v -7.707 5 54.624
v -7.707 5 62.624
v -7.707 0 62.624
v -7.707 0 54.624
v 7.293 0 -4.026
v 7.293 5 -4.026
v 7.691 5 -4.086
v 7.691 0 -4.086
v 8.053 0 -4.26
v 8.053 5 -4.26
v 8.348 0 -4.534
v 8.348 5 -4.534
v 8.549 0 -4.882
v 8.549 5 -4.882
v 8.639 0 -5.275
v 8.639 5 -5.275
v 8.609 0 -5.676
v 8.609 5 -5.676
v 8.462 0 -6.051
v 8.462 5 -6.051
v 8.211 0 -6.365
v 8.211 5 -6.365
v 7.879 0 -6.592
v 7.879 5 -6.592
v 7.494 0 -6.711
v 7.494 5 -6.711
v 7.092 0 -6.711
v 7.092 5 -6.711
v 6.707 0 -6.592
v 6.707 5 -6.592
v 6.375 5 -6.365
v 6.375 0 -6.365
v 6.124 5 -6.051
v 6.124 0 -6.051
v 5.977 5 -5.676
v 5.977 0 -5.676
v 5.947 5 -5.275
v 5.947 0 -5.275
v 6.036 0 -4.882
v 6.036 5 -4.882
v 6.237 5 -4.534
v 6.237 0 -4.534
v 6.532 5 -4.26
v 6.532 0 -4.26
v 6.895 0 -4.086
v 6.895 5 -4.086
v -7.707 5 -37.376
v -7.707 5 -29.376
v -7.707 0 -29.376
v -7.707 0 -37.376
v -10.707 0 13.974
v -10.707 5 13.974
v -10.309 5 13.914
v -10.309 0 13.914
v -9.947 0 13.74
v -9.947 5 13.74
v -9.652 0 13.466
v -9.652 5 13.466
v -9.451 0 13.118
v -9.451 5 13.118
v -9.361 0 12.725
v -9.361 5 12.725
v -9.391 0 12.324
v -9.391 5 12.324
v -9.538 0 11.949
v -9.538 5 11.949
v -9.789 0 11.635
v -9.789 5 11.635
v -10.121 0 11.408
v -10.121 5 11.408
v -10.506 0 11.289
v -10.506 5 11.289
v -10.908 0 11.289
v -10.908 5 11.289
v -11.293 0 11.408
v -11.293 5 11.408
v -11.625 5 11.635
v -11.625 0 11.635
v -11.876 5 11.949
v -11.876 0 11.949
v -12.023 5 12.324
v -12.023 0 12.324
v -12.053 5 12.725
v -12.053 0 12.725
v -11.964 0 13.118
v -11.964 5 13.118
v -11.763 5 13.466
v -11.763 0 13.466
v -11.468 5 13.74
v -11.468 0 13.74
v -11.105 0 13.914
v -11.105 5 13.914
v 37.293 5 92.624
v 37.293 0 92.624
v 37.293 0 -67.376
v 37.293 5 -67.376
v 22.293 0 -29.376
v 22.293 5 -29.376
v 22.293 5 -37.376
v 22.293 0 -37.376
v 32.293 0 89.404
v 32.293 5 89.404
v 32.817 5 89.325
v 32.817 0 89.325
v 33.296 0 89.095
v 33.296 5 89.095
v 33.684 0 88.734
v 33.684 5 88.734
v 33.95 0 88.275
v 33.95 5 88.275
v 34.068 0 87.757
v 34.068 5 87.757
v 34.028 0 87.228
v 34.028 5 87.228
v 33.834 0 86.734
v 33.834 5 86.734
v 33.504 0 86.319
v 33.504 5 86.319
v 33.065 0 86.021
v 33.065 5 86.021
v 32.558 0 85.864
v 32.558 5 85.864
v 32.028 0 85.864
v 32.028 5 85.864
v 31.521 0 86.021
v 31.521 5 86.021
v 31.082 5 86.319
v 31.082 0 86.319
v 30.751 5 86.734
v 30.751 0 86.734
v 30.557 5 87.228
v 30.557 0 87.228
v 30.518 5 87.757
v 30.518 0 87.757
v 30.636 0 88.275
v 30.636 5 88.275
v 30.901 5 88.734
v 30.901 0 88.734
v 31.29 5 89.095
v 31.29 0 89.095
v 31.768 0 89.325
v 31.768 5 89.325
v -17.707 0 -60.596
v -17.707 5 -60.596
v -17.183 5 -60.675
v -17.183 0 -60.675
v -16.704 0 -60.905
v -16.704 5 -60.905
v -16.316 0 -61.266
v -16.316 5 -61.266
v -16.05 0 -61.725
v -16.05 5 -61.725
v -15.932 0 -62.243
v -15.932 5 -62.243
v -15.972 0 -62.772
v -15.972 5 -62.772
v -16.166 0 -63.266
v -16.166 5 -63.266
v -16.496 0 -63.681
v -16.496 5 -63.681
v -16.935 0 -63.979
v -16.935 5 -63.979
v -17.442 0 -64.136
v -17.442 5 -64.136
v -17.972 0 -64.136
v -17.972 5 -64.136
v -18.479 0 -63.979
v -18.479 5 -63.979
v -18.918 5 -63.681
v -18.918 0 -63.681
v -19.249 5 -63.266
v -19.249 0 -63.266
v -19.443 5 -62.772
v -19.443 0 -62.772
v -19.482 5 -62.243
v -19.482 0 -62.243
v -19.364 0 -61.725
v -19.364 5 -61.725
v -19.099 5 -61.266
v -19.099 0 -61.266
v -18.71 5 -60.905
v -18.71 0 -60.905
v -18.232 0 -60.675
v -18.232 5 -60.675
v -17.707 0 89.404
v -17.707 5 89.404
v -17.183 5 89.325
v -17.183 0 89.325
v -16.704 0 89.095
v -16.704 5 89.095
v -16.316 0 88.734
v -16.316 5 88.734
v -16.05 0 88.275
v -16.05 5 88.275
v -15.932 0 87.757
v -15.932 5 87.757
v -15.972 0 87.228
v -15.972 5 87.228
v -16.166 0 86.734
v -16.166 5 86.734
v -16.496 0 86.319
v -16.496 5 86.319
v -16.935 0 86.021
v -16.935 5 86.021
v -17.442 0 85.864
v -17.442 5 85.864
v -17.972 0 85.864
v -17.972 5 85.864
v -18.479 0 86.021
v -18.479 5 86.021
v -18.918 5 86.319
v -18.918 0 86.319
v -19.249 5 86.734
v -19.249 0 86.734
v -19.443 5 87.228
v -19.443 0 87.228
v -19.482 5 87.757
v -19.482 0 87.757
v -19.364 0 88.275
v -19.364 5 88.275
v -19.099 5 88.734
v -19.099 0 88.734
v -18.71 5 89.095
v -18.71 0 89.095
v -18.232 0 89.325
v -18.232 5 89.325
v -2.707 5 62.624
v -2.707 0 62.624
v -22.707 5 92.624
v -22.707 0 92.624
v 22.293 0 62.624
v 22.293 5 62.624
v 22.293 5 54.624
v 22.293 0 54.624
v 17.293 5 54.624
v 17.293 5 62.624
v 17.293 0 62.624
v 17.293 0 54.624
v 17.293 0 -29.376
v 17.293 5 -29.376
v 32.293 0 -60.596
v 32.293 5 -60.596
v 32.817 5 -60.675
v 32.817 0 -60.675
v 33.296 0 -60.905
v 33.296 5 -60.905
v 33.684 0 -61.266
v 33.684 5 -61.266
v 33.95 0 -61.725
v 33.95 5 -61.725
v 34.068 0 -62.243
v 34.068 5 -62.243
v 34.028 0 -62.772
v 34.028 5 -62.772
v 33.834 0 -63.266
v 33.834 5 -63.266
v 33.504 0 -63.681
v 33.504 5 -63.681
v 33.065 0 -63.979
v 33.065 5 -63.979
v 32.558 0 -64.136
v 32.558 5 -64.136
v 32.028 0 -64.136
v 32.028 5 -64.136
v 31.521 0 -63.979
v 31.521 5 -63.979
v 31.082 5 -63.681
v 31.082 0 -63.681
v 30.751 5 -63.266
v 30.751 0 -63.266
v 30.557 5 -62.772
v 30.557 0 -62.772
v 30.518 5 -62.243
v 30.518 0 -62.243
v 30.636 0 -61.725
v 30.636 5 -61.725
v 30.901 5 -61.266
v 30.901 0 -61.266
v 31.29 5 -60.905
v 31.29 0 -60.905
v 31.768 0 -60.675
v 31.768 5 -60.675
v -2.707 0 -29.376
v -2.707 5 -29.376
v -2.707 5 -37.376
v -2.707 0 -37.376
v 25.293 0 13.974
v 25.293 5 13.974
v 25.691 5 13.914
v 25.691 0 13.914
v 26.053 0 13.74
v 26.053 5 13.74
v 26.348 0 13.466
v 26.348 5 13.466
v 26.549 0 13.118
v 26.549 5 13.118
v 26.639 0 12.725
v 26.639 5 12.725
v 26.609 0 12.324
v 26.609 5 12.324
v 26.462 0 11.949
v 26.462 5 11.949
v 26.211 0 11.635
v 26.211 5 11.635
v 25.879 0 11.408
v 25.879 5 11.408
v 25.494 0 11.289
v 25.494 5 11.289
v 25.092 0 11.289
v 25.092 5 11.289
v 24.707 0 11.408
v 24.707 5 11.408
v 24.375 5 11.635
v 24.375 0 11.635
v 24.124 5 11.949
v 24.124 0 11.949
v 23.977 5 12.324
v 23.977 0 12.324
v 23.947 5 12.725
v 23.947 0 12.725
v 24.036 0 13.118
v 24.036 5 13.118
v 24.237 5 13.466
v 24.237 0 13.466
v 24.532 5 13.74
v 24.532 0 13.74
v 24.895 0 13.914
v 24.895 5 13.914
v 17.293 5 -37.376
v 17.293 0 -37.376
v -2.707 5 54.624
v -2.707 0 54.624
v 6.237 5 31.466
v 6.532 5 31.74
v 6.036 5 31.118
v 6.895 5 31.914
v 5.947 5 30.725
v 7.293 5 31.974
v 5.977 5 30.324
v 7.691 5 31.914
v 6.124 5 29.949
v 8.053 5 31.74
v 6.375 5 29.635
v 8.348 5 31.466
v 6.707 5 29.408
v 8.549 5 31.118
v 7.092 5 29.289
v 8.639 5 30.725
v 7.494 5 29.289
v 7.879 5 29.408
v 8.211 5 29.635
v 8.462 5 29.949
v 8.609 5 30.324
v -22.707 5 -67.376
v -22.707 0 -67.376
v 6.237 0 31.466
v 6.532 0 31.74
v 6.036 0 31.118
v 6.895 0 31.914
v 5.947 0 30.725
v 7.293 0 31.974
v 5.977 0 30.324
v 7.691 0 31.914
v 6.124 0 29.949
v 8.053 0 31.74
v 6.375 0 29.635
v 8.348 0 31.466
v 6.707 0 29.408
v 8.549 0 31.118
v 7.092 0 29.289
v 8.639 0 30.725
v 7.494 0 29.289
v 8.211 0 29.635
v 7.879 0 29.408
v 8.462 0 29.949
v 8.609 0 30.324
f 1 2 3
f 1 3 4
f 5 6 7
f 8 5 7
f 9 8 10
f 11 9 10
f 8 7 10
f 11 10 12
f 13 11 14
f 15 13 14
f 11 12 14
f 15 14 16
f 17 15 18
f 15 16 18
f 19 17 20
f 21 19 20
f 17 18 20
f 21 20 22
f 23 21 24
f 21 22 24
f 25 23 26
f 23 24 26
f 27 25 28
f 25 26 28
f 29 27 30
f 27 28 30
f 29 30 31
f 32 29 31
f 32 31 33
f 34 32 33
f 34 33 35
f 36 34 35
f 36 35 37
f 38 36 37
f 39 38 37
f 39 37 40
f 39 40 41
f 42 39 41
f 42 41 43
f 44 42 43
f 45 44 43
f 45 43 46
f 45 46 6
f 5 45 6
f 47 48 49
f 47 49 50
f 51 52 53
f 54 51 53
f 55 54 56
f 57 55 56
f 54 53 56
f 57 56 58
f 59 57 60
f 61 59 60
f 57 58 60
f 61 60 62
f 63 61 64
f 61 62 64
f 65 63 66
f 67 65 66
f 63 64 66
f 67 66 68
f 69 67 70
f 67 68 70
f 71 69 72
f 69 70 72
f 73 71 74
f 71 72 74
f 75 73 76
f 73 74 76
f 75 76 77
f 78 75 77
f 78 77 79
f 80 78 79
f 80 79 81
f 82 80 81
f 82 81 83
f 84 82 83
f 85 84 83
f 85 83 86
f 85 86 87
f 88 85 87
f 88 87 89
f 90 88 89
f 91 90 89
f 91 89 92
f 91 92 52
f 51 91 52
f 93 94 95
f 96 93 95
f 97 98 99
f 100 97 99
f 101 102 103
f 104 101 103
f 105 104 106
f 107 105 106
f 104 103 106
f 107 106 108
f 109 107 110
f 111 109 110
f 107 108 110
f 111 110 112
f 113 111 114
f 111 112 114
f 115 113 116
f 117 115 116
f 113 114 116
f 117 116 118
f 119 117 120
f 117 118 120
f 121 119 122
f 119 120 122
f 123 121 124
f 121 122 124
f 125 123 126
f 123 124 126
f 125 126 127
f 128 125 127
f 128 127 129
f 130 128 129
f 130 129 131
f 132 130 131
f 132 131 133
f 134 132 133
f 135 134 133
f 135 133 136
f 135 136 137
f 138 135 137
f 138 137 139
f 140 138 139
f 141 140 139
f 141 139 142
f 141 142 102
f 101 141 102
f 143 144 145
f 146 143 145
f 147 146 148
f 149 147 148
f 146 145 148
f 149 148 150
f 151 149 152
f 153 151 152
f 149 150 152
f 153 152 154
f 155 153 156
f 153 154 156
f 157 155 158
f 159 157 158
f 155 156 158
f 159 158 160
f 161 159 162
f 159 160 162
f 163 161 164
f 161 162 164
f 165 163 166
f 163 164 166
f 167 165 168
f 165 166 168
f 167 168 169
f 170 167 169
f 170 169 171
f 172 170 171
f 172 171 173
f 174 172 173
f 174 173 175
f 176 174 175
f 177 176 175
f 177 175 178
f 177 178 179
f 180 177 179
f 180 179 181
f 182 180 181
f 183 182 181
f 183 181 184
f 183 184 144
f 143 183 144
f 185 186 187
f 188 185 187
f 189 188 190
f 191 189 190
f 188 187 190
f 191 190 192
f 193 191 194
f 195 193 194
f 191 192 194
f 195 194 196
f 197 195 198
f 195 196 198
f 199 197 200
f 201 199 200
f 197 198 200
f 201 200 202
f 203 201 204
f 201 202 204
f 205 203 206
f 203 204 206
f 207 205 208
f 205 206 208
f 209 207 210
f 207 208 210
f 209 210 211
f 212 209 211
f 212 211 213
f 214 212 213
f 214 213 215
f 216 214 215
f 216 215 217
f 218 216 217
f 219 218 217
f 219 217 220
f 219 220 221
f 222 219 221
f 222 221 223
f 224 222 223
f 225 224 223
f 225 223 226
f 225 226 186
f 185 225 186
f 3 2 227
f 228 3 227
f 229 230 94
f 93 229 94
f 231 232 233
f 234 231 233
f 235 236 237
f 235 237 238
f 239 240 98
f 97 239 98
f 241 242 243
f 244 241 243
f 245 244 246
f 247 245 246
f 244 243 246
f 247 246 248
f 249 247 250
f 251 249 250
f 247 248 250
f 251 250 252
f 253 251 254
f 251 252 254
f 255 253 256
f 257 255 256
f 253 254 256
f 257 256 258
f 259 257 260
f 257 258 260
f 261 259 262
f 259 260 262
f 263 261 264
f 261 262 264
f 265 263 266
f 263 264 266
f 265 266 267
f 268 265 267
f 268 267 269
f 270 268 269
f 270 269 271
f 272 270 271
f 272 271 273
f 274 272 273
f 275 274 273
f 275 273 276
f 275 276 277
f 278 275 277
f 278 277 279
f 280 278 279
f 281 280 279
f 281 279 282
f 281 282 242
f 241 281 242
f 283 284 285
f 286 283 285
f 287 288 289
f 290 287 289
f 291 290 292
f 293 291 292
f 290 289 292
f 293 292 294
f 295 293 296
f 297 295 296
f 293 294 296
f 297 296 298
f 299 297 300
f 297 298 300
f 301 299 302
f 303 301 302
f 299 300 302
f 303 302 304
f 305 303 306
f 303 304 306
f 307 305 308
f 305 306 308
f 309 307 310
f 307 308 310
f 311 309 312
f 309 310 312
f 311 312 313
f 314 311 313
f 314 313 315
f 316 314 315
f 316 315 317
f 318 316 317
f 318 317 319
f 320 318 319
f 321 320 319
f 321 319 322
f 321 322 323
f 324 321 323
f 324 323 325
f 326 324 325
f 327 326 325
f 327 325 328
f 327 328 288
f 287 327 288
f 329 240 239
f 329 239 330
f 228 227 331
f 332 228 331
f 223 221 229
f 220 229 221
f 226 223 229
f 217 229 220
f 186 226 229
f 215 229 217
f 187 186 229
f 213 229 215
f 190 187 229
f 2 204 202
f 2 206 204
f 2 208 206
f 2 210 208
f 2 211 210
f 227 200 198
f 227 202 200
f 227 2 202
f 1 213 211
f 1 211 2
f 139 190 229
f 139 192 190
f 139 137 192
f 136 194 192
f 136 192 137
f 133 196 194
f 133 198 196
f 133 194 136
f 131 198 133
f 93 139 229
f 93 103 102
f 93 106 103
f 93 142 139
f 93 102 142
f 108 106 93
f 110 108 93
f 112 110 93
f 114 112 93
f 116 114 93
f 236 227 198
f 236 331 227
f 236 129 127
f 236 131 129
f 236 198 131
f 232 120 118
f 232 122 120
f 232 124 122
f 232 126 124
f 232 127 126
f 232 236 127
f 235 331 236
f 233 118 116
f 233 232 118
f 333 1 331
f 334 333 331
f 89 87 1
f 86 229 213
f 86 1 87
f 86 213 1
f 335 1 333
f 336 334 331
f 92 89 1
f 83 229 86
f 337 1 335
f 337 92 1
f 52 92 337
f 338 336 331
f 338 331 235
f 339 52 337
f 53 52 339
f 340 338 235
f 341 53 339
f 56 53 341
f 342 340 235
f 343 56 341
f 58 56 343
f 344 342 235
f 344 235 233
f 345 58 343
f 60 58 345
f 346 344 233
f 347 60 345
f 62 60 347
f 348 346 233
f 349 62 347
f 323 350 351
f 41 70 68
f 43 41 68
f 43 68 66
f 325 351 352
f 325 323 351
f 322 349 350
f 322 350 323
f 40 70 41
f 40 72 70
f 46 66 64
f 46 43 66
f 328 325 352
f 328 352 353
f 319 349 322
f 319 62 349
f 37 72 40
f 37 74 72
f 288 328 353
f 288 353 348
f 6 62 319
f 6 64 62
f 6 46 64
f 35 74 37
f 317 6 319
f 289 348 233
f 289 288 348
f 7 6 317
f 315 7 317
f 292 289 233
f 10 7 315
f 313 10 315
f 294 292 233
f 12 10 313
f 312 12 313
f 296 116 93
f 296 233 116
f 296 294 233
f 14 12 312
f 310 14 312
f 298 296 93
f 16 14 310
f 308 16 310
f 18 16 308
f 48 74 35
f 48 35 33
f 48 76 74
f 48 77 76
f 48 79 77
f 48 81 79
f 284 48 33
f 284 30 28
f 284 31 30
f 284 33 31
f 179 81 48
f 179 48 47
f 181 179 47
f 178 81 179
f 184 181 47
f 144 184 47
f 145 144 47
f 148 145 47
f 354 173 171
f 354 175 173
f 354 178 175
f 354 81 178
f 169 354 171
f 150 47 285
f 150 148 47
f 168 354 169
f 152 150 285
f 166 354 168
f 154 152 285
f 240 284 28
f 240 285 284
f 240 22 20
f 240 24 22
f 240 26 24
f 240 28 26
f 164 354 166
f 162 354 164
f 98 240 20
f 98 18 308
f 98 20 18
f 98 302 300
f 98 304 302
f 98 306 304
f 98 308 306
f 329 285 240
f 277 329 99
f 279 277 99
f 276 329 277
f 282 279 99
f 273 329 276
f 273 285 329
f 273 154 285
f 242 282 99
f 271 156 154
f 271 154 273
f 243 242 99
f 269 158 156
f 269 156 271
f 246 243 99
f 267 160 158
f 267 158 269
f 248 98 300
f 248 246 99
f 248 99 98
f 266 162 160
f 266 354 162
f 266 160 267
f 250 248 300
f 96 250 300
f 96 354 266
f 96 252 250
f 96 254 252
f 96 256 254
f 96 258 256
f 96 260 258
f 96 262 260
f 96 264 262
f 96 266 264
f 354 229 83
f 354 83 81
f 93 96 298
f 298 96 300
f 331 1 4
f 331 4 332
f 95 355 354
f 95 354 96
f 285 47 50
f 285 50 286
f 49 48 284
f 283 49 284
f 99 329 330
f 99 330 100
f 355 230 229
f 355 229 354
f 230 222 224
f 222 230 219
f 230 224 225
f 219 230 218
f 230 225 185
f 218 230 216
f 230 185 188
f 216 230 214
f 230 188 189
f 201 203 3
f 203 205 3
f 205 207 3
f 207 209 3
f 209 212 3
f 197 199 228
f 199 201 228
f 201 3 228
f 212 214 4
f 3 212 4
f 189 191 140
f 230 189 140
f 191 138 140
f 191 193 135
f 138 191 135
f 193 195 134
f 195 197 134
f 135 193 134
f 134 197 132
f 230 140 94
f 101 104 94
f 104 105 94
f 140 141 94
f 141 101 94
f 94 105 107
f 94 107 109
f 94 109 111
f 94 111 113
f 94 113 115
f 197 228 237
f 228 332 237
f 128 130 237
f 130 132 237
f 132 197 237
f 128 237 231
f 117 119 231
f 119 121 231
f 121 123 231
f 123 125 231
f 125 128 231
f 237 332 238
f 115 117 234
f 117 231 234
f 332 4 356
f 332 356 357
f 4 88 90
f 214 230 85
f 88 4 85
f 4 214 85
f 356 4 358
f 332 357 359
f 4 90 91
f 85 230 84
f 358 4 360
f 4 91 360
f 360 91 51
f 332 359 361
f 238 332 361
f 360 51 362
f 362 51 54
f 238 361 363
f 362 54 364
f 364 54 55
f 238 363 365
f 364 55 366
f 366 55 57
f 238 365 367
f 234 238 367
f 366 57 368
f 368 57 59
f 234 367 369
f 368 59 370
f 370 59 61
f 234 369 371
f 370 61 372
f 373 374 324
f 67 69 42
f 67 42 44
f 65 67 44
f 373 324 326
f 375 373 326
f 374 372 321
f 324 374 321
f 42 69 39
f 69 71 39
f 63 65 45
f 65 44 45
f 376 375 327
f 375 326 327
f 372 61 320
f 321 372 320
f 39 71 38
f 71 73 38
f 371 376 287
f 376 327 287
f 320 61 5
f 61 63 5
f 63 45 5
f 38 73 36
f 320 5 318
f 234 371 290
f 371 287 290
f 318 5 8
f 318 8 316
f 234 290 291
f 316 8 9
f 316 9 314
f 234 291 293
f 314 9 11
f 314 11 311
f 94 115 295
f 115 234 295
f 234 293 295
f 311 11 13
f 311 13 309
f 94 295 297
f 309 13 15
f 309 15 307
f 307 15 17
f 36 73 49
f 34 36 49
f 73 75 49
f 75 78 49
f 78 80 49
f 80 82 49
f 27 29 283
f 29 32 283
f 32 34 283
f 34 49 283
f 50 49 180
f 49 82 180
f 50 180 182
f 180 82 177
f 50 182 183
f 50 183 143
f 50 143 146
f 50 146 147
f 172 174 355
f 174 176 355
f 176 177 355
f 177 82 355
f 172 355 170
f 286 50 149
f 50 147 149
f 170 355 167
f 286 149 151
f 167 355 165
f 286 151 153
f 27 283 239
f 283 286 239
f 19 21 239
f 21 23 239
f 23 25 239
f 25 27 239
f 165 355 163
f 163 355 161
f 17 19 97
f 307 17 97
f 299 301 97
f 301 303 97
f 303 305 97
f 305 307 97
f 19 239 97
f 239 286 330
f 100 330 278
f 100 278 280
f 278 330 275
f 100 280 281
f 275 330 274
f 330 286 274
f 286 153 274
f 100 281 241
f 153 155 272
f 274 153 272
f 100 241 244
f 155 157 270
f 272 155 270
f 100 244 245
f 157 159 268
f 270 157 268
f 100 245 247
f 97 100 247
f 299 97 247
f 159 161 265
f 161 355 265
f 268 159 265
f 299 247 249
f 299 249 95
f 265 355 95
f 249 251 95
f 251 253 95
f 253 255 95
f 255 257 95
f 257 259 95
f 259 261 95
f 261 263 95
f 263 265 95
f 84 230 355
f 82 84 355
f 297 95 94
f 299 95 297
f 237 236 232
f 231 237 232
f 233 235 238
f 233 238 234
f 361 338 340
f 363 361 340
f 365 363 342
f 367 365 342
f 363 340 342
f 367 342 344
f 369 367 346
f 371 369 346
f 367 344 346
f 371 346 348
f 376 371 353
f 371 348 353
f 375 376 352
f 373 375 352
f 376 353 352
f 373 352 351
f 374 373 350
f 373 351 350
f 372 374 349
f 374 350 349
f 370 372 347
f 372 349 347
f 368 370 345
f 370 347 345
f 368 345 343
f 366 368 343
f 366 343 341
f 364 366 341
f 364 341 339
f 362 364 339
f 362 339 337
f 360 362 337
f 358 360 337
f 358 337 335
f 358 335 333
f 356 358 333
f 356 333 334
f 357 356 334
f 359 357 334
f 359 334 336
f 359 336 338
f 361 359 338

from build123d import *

# Parameters (mm, degrees)
SKETCH1_W           = 60
SKETCH1_H           = 160
BOSS_EXTRUDE1_DEPTH = 5
SKETCH2_R           = 1.78
CUT_EXTRUDE1_DEPTH  = 100.9750816
SKETCH3_R           = 1.35
CUT_EXTRUDE2_DEPTH  = 100.9750816
SKETCH4_W           = 5
SKETCH4_H           = 8
CUT_EXTRUDE3_DEPTH  = 100.9750816


with BuildPart() as part:
    # Sketch1 → Boss-Extrude1 (new body)
    with BuildSketch(Plane(origin=(0, 0, 0), x_dir=(1, 0, 0), z_dir=(0, 1, 0))):
        with Locations((7.29281768, -12.624309392)):
            Rectangle(SKETCH1_W, SKETCH1_H)
    extrude(amount=BOSS_EXTRUDE1_DEPTH)

    # Sketch2 → Cut-Extrude1 (cut, through all)
    with BuildSketch(Plane(origin=(0, 5, 0), x_dir=(1, 0, 0), z_dir=(0, 1, 0))):
        with Locations(Location((-17.70718232, 62.375690608, 0), (0, 0, 270))):
            Circle(SKETCH2_R)
        with Locations(Location((32.29281768, 62.375690608, 0), (0, 0, 270))):
            Circle(SKETCH2_R)
        with Locations(Location((32.29281768, -87.624309392, 0), (0, 0, 270))):
            Circle(SKETCH2_R)
        with Locations(Location((-17.70718232, -87.624309392, 0), (0, 0, 270))):
            Circle(SKETCH2_R)
    extrude(amount=-CUT_EXTRUDE1_DEPTH, mode=Mode.SUBTRACT)

    # Sketch3 → Cut-Extrude2 (cut, through all)
    with BuildSketch(Plane(origin=(0, 5, 0), x_dir=(1, 0, 0), z_dir=(0, 1, 0))):
        with Locations(Location((25.29281768, -12.624309392, 0), (0, 0, 270))):
            Circle(SKETCH3_R)
        with Locations(Location((-10.70718232, -12.624309392, 0), (0, 0, 270))):
            Circle(SKETCH3_R)
        with Locations(Location((7.29281768, 5.375690608, 0), (0, 0, 270))):
            Circle(SKETCH3_R)
        with Locations(Location((7.29281768, -30.624309392, 0), (0, 0, 270))):
            Circle(SKETCH3_R)
    extrude(amount=-CUT_EXTRUDE2_DEPTH, mode=Mode.SUBTRACT)

    # Sketch4 → Cut-Extrude3 (cut, through all)
    with BuildSketch(Plane(origin=(0, 5, 0), x_dir=(1, 0, 0), z_dir=(0, 1, 0))):
        with Locations((-5.20718232, 33.375690608)):
            Rectangle(SKETCH4_W, SKETCH4_H)
        with Locations((19.79281768, 33.375690608)):
            Rectangle(SKETCH4_W, SKETCH4_H)
        with Locations((19.79281768, -58.624309392)):
            Rectangle(SKETCH4_W, SKETCH4_H)
        with Locations((-5.20718232, -58.624309392)):
            Rectangle(SKETCH4_W, SKETCH4_H)
    extrude(amount=-CUT_EXTRUDE3_DEPTH, mode=Mode.SUBTRACT)


solid = part.part
